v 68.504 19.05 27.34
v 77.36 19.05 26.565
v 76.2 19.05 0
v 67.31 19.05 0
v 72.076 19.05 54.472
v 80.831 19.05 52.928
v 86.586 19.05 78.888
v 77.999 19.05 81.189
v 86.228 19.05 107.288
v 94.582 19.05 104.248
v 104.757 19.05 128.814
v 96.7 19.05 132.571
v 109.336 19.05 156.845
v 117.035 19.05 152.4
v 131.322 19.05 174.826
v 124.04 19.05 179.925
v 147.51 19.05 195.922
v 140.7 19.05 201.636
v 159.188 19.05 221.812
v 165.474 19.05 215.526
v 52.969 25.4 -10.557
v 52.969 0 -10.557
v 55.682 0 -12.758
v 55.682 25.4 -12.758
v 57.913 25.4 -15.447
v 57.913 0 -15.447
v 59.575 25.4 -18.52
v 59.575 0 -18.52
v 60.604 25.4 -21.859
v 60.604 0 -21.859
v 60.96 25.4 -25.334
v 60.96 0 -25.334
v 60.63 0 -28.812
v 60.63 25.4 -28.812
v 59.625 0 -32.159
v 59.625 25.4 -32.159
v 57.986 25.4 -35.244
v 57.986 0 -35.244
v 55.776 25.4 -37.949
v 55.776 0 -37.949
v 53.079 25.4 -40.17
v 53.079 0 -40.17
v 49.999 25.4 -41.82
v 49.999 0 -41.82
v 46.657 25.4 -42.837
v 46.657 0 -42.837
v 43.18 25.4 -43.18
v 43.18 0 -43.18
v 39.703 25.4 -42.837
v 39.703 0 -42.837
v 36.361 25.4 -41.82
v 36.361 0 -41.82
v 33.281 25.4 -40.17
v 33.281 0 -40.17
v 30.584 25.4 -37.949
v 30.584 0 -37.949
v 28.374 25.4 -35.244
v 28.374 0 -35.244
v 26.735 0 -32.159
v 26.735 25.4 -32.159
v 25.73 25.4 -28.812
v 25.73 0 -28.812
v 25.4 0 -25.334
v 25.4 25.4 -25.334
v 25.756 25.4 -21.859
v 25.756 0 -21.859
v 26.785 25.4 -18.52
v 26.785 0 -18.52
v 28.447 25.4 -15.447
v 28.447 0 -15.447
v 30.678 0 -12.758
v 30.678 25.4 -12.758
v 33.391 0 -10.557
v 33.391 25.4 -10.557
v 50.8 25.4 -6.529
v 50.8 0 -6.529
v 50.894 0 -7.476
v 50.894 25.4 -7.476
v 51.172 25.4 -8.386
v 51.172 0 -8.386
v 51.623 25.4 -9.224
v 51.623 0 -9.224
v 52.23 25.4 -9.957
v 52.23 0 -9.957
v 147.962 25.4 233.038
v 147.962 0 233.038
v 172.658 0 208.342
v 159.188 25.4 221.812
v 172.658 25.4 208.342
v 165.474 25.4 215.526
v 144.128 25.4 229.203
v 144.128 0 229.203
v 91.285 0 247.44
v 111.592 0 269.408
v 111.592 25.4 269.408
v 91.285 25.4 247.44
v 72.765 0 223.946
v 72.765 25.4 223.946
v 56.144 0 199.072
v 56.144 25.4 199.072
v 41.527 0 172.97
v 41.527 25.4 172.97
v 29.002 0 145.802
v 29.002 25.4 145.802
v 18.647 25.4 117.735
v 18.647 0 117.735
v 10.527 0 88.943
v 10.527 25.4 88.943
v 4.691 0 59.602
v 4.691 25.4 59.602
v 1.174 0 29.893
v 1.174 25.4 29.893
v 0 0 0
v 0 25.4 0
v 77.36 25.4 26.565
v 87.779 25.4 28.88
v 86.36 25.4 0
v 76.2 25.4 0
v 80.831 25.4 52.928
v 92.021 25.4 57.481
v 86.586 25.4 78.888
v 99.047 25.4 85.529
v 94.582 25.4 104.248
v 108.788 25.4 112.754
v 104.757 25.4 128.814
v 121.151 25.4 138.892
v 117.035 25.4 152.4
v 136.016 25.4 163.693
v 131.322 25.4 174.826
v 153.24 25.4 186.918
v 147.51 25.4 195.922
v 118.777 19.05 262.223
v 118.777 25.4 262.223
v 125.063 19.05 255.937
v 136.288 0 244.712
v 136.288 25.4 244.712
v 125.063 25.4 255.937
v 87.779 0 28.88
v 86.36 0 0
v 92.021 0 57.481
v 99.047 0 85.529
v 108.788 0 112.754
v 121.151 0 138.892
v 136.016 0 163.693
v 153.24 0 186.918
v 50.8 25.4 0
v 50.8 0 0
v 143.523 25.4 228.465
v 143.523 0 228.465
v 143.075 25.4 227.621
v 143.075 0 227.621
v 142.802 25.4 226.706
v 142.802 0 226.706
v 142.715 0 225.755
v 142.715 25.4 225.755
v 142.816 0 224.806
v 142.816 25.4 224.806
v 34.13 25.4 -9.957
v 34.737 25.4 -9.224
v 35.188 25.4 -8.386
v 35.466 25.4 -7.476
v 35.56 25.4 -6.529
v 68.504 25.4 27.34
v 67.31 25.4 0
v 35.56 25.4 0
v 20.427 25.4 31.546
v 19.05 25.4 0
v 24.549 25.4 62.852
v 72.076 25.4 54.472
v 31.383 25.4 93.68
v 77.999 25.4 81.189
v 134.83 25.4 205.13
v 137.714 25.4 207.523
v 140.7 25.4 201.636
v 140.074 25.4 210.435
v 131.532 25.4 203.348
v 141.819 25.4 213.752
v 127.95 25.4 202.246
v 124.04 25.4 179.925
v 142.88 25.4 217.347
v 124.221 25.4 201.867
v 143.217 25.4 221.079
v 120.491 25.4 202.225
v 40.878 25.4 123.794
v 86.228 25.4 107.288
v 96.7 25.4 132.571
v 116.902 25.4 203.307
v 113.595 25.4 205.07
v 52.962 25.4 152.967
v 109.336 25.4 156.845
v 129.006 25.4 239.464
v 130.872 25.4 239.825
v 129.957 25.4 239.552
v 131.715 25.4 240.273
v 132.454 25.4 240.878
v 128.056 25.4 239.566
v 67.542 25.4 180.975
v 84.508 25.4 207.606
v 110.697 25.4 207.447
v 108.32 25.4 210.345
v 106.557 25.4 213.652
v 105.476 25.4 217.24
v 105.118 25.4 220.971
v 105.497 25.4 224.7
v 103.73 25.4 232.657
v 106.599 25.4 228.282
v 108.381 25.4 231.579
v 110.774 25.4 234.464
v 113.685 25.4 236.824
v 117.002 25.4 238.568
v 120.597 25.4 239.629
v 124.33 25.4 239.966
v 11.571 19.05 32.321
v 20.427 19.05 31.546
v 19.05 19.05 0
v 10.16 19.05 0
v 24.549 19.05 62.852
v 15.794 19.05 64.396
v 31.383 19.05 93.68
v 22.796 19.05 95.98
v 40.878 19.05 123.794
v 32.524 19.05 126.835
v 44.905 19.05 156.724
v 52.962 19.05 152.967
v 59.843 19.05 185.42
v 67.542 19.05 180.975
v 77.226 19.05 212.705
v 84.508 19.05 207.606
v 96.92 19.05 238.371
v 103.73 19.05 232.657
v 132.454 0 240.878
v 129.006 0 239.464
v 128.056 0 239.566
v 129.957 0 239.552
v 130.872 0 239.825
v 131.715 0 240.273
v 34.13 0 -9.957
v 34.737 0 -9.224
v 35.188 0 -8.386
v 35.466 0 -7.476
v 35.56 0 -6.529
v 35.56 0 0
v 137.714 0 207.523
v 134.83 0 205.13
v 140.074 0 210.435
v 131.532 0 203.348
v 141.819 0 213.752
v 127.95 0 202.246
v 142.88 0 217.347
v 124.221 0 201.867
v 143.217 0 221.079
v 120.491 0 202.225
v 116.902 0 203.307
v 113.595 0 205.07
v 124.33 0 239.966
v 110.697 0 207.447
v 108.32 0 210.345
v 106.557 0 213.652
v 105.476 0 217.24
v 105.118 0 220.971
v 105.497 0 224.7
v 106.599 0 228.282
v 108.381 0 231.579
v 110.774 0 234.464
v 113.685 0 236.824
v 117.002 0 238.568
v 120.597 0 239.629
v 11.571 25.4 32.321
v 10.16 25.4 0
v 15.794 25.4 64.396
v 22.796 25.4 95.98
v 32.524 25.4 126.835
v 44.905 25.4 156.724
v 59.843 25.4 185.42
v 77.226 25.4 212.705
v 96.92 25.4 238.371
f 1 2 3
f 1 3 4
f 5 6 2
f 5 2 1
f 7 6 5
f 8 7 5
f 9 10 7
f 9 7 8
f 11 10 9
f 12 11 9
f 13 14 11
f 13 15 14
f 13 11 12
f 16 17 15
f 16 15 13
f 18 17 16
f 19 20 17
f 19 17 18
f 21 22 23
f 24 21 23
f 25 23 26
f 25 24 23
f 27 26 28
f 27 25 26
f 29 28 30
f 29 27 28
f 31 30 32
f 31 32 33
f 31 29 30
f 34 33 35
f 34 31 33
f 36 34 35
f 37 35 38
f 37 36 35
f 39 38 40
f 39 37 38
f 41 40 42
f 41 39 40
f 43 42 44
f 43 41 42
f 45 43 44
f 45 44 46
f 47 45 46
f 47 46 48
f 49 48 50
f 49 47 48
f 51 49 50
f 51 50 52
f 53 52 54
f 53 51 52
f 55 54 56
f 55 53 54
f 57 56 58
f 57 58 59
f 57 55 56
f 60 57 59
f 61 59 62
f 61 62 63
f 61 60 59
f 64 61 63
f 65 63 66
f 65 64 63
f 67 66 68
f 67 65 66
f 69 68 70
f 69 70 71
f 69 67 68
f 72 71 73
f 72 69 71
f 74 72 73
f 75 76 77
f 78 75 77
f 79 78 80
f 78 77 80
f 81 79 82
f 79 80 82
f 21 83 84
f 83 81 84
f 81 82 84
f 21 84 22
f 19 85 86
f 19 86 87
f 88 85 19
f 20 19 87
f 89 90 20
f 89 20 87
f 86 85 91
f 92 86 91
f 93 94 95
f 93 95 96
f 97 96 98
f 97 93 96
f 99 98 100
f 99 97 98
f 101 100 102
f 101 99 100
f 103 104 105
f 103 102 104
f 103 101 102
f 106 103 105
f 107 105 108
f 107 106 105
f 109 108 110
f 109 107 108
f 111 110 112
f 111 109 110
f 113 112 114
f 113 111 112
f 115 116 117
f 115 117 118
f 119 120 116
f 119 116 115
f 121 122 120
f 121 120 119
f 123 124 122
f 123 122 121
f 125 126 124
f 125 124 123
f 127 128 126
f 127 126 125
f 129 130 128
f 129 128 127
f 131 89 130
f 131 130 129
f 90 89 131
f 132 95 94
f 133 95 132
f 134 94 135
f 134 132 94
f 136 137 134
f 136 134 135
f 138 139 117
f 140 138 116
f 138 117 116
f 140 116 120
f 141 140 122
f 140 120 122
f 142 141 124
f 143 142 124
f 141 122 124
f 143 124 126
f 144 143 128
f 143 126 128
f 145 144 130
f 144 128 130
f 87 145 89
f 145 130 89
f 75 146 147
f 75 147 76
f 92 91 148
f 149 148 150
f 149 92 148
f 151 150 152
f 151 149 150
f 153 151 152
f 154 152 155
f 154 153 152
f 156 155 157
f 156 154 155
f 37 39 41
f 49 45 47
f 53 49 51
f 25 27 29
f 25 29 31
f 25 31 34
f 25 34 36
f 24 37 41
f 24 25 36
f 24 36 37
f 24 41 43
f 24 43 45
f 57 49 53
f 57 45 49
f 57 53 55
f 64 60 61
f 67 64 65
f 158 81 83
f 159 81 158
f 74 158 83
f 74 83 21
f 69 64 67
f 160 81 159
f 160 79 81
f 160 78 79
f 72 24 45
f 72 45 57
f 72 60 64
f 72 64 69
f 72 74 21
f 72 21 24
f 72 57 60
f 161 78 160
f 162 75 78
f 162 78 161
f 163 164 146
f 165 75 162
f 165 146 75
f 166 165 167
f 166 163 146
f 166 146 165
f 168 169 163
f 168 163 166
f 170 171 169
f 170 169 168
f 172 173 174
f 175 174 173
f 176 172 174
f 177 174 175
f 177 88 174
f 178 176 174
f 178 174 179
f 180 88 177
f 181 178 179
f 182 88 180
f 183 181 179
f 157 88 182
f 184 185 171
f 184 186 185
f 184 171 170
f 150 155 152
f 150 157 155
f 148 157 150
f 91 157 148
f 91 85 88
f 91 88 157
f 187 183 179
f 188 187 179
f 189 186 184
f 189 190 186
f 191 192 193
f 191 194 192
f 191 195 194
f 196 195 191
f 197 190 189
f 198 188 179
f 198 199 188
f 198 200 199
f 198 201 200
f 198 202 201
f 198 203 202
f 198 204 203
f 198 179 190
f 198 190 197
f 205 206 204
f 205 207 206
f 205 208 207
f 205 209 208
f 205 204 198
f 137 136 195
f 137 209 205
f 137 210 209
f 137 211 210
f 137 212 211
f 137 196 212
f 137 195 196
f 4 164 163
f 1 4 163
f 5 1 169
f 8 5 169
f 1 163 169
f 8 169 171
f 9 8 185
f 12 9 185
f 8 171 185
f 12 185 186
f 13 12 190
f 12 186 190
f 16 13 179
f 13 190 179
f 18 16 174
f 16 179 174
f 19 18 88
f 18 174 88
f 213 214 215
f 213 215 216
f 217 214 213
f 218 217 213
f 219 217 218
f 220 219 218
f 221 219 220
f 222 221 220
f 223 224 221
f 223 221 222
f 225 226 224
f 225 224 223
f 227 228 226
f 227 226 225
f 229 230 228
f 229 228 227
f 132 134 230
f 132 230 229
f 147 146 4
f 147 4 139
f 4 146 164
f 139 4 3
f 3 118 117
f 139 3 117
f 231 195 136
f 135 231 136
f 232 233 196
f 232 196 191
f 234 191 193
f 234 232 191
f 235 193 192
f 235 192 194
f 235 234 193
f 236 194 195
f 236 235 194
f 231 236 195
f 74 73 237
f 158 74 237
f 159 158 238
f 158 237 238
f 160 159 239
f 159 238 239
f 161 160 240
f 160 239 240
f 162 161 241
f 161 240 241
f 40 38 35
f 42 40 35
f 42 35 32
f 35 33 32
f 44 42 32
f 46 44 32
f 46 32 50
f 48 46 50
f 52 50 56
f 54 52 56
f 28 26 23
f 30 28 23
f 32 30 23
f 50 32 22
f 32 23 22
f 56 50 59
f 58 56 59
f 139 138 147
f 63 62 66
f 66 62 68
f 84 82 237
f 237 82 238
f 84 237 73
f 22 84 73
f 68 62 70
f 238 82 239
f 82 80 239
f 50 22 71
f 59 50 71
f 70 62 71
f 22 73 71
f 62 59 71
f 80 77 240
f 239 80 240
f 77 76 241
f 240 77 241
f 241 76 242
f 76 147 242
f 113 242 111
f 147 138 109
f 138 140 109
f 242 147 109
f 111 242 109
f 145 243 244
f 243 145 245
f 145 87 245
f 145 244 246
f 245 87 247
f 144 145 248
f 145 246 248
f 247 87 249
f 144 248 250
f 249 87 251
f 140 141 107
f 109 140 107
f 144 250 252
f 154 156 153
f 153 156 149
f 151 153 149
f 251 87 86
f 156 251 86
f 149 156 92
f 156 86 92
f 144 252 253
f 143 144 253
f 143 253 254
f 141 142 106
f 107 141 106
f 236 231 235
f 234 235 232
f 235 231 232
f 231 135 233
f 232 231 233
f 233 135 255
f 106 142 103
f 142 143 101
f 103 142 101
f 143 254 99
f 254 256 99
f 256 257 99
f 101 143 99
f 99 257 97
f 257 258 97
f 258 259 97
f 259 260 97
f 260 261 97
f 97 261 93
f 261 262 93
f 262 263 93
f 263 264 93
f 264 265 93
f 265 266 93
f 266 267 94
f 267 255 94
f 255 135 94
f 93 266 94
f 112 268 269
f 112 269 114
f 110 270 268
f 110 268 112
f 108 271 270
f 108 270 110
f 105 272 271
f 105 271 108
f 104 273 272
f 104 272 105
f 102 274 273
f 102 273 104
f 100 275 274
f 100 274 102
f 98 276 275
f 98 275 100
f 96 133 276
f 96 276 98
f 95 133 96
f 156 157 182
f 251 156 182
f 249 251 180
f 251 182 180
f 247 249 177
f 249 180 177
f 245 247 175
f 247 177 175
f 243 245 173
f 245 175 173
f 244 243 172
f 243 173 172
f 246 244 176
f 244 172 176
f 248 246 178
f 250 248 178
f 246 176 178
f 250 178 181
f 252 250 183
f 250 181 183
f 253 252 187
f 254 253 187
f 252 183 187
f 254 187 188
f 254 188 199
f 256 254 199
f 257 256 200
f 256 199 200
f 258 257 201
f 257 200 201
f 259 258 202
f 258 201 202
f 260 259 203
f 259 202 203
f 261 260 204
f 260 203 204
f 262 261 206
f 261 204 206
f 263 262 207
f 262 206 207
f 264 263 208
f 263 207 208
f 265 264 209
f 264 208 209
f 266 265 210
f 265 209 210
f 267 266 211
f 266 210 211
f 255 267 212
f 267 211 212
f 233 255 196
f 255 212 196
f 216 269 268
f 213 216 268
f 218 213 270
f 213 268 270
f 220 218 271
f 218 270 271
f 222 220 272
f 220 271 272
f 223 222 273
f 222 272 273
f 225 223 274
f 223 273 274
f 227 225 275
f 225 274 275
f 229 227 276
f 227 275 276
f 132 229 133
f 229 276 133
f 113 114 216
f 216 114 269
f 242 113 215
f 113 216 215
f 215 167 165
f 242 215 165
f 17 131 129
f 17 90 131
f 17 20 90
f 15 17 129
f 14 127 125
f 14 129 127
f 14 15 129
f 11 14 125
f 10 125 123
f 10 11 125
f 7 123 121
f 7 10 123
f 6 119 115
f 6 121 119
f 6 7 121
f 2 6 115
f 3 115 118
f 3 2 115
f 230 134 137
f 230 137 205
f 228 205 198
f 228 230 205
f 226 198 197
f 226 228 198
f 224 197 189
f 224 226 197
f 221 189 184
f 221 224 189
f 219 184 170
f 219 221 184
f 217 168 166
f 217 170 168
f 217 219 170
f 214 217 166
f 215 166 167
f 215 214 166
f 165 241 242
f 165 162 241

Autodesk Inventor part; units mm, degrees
ref_plane "YZ Plane" through (0, 0, 0) normal (1, 0, 0) x (0, 1, 0)
ref_plane "XZ Plane" through (0, 0, 0) normal (0, 1, 0) x (-1, 0, 0)
ref_plane "XY Plane" through (0, 0, 0) normal (0, 0, 1) x (1, 0, 0)
sketch "MainSketch1" plane through (0, 0, 0) normal (0, 0, 1) x (1, 0, 0)
  line L0 (0, 0) -> (86.36, 0)
  line L1 (86.36, 0) -> (86.36, 25.4)
  line L2 (86.36, 25.4) -> (76.2, 25.4)
  line L3 (76.2, 25.4) -> (76.2, 19.05)
  line L4 (76.2, 19.05) -> (67.31, 19.05)
  line L5 (67.31, 19.05) -> (67.31, 25.4)
  line L6 (67.31, 25.4) -> (19.05, 25.4)
  line L7 (19.05, 25.4) -> (19.05, 19.05)
  line L8 (19.05, 19.05) -> (10.16, 19.05)
  line L9 (10.16, 19.05) -> (10.16, 25.4)
  line L10 (10.16, 25.4) -> (0, 25.4)
  line L11 (0, 25.4) -> (0, 0)
  line L12 (381, 0) -> (381, 63.5) construction
  dimension "d0" = 86.36
  dimension "d1" = 10.16
  dimension "d2" = 19.05
  dimension "d3" = 67.31
  dimension "d4" = 76.2
  dimension "d5" = 19.05
  dimension "d6" = 25.4
  dimension "d7" = 25.4
  dimension "d8" = 19.05
  dimension "d9" = 25.4
  dimension "d10" = 381
  dimension "d30" = 63.5
revolve "MainRevolution1" add sketch "MainSketch1" angle 45 about axis through (381, 0, 0) along (0, 1, 0)
sketch "HeadSketch" plane through (19.05, 25.4, 0) normal (0, 1, 0) x (1, 0, 0)
  line L0 (48.26, 0) -> (0, 0) projected
  arc A0 (31.75, 9.3356) -> (16.51, 9.3356) centre (24.13, 25.4) ccw
  arc A1 (-19.05, 0) -> (92.5423, -269.4077) centre (361.95, 0) ccw projected
  arc A2 (67.31, 0) -> (153.6081, -208.3419) centre (361.95, 0) ccw projected
  line L1 (-8.89, 0) -> (-19.05, 0) projected
  line L2 (67.31, 0) -> (57.15, 0) projected
  line L3 (57.15, 0) -> (48.26, 0) projected
  line L4 (0, 0) -> (-8.89, 0) projected
  line L5 (92.5423, -269.4077) -> (99.7265, -262.2235) projected
  line L6 (99.7265, -262.2235) -> (106.0127, -255.9373) projected
  line L7 (140.1377, -221.8123) -> (146.4239, -215.5261) projected
  line L8 (146.4239, -215.5261) -> (153.6081, -208.3419)
  line L9 (16.51, 0) -> (31.75, 0)
  line L10 (31.75, 0) -> (31.75, 9.3356)
  line L11 (16.51, 9.3356) -> (16.51, 0)
  line L12 (106.0127, -255.9373) -> (140.1377, -221.8123) projected
  arc A3 (123.0945, -227.2198) -> (111.4202, -238.8941) centre (105.1174, -220.917) ccw
  line L13 (128.9124, -233.0376) -> (123.0945, -227.2198)
  line L14 (111.4202, -238.8941) -> (117.238, -244.712)
  line L15 (117.238, -244.712) -> (128.9124, -233.0376)
  line L16 (123.0945, -227.2198) -> (111.4202, -238.8941) construction
  line L17 (105.1174, -220.917) -> (123.0752, -238.8748) construction
  point P0 (24.13, 0)
  dimension "d12" = 43.18
  dimension "d13" = 25.4
  dimension "d14" = 35.56
  dimension "d15" = 15.24
  dimension "d16" = 43.18
  dimension "d26" = 38.1
  dimension "d27" = 16.51
  dimension "d32" = 90
  dimension "d33" = 90
  dimension "d34" = 17.9578
extrude "TopHeadExtrusion1" add sketch "HeadSketch" against normal blind 25.4 contours L0 L11 A0 L10
extrude "BottomHeadCut" cut sketch "HeadSketch" against normal through all contours L12 L14 A3 L13
fillet "NeckFillet" radius 4.826 4 edges at (50.8, 12.7, -9.3356) (35.56, 12.7, -9.3356) (142.1445, 12.7, 227.2198) (130.4702, 12.7, 238.8941)
properties part number "CurvedTrack"
